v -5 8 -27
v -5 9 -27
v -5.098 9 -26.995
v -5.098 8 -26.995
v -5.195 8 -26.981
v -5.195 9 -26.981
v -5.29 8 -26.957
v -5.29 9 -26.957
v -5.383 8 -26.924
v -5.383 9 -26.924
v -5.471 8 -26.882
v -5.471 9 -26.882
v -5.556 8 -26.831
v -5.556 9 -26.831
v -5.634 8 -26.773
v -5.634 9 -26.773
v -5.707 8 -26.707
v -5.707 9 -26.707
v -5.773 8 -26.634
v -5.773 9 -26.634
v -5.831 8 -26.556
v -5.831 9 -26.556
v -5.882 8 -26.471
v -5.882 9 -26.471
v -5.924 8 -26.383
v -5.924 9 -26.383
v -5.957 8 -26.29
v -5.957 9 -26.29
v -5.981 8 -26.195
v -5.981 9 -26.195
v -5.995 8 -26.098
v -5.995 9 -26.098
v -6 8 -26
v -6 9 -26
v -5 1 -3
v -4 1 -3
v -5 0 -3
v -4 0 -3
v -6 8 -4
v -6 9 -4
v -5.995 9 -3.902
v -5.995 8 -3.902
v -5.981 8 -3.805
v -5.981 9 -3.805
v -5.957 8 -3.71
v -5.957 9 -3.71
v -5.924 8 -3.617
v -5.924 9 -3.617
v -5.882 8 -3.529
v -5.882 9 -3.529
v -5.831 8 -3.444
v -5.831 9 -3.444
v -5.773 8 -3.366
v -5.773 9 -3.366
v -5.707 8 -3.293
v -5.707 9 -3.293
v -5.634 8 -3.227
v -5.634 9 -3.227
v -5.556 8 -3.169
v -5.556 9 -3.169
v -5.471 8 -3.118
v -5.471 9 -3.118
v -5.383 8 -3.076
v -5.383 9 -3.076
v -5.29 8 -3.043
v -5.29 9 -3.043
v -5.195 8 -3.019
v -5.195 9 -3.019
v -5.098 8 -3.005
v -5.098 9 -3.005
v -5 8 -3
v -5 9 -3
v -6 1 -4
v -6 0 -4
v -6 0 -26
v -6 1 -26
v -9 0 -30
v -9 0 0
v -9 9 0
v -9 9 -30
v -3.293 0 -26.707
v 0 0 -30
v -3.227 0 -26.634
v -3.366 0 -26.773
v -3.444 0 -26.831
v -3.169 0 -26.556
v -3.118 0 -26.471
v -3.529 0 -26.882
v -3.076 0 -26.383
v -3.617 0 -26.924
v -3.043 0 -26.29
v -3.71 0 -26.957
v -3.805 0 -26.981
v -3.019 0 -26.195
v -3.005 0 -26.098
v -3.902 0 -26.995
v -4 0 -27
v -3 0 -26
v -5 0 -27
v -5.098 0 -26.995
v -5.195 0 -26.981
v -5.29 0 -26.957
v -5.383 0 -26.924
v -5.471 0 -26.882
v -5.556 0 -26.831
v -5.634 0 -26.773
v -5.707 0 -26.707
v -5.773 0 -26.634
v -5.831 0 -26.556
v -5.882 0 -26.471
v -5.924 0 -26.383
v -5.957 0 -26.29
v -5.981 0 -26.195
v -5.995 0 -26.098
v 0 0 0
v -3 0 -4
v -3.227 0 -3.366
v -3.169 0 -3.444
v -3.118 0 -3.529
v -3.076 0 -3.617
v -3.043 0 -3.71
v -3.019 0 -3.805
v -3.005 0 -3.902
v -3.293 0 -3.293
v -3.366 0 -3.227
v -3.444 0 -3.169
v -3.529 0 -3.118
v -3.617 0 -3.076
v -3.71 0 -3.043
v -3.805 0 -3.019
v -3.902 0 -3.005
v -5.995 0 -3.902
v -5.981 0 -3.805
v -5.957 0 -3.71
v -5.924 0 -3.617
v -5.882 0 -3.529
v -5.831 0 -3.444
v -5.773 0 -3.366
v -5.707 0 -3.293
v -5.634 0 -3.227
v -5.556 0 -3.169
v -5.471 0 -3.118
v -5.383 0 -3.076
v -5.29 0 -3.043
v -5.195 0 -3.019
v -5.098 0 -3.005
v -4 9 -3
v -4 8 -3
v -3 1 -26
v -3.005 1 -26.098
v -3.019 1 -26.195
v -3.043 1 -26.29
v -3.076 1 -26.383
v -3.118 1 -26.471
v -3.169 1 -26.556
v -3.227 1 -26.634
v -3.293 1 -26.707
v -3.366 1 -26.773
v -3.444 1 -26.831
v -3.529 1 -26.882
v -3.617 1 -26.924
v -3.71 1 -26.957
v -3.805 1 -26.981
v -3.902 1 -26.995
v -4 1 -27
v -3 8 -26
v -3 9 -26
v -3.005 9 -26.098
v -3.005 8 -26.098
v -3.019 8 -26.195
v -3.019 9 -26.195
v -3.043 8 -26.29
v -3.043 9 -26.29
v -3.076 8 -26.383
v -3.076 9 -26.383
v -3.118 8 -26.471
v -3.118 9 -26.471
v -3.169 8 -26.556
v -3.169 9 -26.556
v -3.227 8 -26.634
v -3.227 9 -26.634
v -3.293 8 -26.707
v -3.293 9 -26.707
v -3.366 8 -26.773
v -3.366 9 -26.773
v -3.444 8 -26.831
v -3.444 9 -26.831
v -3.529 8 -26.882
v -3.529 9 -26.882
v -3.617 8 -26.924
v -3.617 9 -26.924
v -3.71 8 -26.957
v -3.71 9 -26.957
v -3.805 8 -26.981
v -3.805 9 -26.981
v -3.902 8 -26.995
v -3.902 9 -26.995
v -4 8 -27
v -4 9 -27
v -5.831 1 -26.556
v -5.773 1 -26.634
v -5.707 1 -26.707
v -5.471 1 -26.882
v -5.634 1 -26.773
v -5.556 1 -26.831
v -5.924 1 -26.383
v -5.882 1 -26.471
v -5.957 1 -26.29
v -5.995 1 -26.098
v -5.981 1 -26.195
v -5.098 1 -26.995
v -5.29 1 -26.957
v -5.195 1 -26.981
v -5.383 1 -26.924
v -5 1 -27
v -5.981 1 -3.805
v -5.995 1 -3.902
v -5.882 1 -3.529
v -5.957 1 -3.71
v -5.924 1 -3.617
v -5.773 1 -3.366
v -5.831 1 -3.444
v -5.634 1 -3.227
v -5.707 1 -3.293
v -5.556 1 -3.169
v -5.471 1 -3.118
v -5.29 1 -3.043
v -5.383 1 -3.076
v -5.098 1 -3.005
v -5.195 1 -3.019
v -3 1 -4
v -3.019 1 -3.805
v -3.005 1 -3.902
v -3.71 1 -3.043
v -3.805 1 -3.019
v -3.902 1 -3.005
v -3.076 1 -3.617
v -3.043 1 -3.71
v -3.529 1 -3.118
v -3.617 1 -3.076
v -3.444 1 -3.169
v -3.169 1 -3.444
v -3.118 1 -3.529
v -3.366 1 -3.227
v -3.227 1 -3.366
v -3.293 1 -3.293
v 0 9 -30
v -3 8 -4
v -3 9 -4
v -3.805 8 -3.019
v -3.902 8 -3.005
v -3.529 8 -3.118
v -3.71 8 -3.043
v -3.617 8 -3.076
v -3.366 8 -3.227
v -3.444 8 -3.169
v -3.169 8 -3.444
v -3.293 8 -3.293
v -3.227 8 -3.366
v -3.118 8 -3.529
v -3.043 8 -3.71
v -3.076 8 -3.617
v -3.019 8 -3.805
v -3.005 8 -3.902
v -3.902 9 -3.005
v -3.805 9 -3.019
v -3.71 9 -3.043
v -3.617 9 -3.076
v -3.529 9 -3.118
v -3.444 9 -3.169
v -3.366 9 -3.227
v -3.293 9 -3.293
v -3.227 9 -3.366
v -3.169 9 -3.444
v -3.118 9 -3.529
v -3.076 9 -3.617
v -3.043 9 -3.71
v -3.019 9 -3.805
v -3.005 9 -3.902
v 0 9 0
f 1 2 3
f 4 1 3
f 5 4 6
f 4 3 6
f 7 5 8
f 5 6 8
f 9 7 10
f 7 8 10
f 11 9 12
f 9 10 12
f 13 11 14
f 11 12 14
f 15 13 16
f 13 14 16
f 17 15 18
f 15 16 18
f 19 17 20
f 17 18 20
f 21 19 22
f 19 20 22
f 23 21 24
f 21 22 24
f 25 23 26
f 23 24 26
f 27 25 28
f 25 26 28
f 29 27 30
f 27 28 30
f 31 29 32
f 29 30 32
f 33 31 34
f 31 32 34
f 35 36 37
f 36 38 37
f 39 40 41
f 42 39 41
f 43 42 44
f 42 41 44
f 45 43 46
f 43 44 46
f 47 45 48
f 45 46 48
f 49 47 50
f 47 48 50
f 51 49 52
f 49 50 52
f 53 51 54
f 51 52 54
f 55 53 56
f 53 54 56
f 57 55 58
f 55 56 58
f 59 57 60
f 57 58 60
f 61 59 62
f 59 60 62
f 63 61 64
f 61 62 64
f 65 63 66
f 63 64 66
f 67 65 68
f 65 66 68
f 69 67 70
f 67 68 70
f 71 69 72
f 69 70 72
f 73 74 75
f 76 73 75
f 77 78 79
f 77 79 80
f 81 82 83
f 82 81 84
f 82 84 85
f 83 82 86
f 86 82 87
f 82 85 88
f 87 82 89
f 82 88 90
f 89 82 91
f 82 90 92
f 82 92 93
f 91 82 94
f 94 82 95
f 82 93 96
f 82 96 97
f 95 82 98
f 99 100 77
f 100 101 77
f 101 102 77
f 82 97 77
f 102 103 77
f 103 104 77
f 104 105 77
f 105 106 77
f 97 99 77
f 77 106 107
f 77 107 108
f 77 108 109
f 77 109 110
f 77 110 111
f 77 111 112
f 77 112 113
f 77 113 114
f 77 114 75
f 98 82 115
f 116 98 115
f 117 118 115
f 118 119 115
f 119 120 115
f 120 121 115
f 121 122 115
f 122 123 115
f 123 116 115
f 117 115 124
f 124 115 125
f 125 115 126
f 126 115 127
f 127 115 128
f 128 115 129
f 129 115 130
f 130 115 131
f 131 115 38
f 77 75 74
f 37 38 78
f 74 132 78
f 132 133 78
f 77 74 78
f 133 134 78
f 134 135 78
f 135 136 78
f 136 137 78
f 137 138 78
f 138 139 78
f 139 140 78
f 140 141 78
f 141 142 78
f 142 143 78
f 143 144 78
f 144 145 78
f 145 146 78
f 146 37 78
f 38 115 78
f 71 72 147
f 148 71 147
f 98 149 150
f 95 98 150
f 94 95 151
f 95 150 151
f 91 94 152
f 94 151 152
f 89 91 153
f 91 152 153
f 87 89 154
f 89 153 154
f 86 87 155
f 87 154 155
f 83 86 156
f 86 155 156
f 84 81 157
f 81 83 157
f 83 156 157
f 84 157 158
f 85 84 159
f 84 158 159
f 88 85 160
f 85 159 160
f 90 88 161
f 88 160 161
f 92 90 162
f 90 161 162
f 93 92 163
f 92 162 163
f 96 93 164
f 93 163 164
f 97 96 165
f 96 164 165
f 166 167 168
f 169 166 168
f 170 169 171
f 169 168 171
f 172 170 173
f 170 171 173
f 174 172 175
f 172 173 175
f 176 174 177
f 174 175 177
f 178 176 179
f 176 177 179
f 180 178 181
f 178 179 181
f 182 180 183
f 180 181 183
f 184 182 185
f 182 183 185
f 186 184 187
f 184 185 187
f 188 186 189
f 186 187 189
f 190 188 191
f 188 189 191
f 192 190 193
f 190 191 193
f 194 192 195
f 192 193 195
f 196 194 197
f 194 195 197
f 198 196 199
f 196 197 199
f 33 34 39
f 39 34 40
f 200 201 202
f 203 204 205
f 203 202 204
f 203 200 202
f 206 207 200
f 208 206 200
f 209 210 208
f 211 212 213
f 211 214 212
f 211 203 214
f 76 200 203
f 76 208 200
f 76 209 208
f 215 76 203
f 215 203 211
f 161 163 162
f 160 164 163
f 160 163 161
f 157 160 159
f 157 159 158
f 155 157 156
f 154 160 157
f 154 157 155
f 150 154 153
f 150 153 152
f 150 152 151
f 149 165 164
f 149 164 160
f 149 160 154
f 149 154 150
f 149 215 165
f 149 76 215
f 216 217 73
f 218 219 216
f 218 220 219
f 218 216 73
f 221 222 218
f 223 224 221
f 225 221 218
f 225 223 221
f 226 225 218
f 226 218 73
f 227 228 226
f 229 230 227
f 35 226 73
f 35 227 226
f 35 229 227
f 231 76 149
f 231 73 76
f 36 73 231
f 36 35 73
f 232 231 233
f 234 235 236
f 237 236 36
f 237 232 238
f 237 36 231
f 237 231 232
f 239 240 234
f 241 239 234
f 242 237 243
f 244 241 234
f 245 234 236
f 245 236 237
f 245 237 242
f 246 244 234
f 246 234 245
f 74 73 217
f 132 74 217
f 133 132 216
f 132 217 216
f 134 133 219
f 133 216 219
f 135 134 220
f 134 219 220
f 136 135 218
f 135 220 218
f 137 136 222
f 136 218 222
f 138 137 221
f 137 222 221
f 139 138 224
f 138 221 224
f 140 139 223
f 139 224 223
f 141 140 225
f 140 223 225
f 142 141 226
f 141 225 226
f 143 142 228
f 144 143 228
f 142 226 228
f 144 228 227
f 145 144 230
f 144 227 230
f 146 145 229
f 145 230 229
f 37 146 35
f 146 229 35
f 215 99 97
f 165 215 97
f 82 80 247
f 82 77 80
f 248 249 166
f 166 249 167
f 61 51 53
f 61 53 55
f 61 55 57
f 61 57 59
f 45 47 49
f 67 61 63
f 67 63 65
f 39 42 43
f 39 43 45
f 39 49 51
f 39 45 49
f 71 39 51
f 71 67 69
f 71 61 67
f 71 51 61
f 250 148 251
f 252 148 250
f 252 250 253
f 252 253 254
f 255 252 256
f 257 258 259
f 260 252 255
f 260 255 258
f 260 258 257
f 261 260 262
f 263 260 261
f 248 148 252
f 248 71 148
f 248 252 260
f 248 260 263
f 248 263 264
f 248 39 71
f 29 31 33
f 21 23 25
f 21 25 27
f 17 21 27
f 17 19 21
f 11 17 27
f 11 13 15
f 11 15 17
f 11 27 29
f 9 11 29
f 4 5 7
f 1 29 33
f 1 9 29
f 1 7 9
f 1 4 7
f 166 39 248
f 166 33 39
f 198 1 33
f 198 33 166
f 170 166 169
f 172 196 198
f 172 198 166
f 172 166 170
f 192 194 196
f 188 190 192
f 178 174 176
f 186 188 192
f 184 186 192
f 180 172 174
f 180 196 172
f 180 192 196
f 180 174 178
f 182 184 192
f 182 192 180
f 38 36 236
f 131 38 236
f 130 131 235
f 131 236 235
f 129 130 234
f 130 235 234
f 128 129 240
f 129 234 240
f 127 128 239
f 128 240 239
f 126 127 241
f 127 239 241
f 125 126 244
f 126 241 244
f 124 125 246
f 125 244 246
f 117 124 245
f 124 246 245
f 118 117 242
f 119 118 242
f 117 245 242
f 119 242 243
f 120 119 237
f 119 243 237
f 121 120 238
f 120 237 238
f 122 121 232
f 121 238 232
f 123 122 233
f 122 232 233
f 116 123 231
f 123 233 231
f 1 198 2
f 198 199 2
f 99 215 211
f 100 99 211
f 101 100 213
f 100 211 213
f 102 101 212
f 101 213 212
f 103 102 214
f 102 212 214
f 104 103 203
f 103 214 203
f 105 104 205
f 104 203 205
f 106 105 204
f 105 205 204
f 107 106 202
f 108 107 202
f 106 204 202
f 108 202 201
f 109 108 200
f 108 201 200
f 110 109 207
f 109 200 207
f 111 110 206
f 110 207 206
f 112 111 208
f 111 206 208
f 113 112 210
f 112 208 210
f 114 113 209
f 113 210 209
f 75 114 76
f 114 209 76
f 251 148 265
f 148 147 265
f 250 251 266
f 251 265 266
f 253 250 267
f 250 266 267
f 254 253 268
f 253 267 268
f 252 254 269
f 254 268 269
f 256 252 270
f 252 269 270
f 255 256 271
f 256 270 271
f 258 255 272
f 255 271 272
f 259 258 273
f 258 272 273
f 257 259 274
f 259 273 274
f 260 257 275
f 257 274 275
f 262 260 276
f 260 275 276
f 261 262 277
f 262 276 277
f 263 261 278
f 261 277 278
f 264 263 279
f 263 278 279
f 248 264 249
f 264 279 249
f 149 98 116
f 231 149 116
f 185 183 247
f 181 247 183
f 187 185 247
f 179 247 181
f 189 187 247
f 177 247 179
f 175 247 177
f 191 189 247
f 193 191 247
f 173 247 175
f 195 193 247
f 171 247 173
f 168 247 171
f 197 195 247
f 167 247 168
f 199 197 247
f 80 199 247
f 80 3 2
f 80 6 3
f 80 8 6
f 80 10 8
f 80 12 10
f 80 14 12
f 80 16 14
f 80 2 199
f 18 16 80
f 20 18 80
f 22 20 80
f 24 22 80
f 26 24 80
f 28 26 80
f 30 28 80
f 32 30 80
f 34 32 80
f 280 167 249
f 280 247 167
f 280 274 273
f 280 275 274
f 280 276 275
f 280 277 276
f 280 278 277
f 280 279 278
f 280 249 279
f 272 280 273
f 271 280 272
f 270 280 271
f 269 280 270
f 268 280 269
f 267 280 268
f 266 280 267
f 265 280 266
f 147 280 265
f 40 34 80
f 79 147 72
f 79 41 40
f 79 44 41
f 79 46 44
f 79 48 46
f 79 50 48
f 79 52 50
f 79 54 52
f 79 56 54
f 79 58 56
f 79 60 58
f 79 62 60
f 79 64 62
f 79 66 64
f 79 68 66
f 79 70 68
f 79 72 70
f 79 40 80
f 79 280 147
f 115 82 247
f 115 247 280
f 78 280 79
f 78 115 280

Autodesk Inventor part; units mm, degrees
ref_plane "YZ Plane" through (0, 0, 0) normal (1, 0, 0) x (0, 1, 0)
ref_plane "XZ Plane" through (0, 0, 0) normal (0, 1, 0) x (-1, 0, 0)
ref_plane "XY Plane" through (0, 0, 0) normal (0, 0, 1) x (1, 0, 0)
sketch "Sketch1" plane through (0, 0, 0) normal (0, 1, 0) x (-1, 0, 0)
  line L0 (0, 0) -> (9, 0)
  line L1 (9, 0) -> (9, -30)
  line L2 (9, -30) -> (0, -30)
  line L3 (0, -30) -> (0, 0)
  dimension "d0" = 9
  dimension "d1" = 30
extrude "Extrusion1" add sketch "Sketch1" along normal blind 9
sketch "Sketch2" plane through (0, 0, 0) normal (0, -1, 0) x (1, 0, 0)
  line L0 (-3, -3) -> (-6, -3)
  line L1 (-6, -3) -> (-6, -27)
  line L2 (-6, -27) -> (-3, -27)
  line L3 (-3, -27) -> (-3, -3)
  line L4 (0, 0) -> (0, -30) projected
  line L5 (-9, -30) -> (-9, 0) projected
  line L6 (-9, 0) -> (0, 0) projected
  line L7 (0, -30) -> (-9, -30) projected
  point P0 (-4.5, 0)
  point P1 (-4.5, -30)
  dimension "d4" = 3
  dimension "d5" = 3
  dimension "d6" = 3
  dimension "d7" = 3
extrude "Extrusion2" cut sketch "Sketch2" against normal blind 1 contours L3 L2 L1 L0
fillet "Fillet1" radius 1 4 edges at (-6, 0.5, -27) (-3, 0.5, -27) (-6, 0.5, -3) (-3, 0.5, -3)
sketch "Sketch3" plane through (0, 9, 0) normal (0, 1, 0) x (1, 0, 0)
  line L0 (-5, 3) -> (-4, 3)
  line L1 (-3, 4) -> (-3, 26)
  line L2 (-4, 27) -> (-5, 27)
  line L3 (-6, 26) -> (-6, 4)
  arc A0 (-6, 4) -> (-5, 3) centre (-5, 4) ccw
  arc A1 (-5, 27) -> (-6, 26) centre (-5, 26) ccw
  arc A2 (-3, 26) -> (-4, 27) centre (-4, 26) ccw
  arc A3 (-4, 3) -> (-3, 4) centre (-4, 4) ccw
  line L4 (0, 0) -> (0, 30) projected
  line L5 (-9, 30) -> (-9, 0) projected
  line L6 (-9, 0) -> (0, 0) projected
  line L7 (0, 30) -> (-9, 30) projected
  point P0 (-4.5, 0)
  point P1 (-4.5, 3)
  point P2 (-4.5, 30)
  point P3 (-4.5, 27)
  dimension "d11" = 1
  dimension "d12" = 1
  dimension "d13" = 3
  dimension "d14" = 3
  dimension "d15" = 3
  dimension "d16" = 3
extrude "Extrusion3" cut sketch "Sketch3" against normal blind 1 contours A0 L3 A1 L2 A2 L1 A3 L0
properties part number "oled_support"
